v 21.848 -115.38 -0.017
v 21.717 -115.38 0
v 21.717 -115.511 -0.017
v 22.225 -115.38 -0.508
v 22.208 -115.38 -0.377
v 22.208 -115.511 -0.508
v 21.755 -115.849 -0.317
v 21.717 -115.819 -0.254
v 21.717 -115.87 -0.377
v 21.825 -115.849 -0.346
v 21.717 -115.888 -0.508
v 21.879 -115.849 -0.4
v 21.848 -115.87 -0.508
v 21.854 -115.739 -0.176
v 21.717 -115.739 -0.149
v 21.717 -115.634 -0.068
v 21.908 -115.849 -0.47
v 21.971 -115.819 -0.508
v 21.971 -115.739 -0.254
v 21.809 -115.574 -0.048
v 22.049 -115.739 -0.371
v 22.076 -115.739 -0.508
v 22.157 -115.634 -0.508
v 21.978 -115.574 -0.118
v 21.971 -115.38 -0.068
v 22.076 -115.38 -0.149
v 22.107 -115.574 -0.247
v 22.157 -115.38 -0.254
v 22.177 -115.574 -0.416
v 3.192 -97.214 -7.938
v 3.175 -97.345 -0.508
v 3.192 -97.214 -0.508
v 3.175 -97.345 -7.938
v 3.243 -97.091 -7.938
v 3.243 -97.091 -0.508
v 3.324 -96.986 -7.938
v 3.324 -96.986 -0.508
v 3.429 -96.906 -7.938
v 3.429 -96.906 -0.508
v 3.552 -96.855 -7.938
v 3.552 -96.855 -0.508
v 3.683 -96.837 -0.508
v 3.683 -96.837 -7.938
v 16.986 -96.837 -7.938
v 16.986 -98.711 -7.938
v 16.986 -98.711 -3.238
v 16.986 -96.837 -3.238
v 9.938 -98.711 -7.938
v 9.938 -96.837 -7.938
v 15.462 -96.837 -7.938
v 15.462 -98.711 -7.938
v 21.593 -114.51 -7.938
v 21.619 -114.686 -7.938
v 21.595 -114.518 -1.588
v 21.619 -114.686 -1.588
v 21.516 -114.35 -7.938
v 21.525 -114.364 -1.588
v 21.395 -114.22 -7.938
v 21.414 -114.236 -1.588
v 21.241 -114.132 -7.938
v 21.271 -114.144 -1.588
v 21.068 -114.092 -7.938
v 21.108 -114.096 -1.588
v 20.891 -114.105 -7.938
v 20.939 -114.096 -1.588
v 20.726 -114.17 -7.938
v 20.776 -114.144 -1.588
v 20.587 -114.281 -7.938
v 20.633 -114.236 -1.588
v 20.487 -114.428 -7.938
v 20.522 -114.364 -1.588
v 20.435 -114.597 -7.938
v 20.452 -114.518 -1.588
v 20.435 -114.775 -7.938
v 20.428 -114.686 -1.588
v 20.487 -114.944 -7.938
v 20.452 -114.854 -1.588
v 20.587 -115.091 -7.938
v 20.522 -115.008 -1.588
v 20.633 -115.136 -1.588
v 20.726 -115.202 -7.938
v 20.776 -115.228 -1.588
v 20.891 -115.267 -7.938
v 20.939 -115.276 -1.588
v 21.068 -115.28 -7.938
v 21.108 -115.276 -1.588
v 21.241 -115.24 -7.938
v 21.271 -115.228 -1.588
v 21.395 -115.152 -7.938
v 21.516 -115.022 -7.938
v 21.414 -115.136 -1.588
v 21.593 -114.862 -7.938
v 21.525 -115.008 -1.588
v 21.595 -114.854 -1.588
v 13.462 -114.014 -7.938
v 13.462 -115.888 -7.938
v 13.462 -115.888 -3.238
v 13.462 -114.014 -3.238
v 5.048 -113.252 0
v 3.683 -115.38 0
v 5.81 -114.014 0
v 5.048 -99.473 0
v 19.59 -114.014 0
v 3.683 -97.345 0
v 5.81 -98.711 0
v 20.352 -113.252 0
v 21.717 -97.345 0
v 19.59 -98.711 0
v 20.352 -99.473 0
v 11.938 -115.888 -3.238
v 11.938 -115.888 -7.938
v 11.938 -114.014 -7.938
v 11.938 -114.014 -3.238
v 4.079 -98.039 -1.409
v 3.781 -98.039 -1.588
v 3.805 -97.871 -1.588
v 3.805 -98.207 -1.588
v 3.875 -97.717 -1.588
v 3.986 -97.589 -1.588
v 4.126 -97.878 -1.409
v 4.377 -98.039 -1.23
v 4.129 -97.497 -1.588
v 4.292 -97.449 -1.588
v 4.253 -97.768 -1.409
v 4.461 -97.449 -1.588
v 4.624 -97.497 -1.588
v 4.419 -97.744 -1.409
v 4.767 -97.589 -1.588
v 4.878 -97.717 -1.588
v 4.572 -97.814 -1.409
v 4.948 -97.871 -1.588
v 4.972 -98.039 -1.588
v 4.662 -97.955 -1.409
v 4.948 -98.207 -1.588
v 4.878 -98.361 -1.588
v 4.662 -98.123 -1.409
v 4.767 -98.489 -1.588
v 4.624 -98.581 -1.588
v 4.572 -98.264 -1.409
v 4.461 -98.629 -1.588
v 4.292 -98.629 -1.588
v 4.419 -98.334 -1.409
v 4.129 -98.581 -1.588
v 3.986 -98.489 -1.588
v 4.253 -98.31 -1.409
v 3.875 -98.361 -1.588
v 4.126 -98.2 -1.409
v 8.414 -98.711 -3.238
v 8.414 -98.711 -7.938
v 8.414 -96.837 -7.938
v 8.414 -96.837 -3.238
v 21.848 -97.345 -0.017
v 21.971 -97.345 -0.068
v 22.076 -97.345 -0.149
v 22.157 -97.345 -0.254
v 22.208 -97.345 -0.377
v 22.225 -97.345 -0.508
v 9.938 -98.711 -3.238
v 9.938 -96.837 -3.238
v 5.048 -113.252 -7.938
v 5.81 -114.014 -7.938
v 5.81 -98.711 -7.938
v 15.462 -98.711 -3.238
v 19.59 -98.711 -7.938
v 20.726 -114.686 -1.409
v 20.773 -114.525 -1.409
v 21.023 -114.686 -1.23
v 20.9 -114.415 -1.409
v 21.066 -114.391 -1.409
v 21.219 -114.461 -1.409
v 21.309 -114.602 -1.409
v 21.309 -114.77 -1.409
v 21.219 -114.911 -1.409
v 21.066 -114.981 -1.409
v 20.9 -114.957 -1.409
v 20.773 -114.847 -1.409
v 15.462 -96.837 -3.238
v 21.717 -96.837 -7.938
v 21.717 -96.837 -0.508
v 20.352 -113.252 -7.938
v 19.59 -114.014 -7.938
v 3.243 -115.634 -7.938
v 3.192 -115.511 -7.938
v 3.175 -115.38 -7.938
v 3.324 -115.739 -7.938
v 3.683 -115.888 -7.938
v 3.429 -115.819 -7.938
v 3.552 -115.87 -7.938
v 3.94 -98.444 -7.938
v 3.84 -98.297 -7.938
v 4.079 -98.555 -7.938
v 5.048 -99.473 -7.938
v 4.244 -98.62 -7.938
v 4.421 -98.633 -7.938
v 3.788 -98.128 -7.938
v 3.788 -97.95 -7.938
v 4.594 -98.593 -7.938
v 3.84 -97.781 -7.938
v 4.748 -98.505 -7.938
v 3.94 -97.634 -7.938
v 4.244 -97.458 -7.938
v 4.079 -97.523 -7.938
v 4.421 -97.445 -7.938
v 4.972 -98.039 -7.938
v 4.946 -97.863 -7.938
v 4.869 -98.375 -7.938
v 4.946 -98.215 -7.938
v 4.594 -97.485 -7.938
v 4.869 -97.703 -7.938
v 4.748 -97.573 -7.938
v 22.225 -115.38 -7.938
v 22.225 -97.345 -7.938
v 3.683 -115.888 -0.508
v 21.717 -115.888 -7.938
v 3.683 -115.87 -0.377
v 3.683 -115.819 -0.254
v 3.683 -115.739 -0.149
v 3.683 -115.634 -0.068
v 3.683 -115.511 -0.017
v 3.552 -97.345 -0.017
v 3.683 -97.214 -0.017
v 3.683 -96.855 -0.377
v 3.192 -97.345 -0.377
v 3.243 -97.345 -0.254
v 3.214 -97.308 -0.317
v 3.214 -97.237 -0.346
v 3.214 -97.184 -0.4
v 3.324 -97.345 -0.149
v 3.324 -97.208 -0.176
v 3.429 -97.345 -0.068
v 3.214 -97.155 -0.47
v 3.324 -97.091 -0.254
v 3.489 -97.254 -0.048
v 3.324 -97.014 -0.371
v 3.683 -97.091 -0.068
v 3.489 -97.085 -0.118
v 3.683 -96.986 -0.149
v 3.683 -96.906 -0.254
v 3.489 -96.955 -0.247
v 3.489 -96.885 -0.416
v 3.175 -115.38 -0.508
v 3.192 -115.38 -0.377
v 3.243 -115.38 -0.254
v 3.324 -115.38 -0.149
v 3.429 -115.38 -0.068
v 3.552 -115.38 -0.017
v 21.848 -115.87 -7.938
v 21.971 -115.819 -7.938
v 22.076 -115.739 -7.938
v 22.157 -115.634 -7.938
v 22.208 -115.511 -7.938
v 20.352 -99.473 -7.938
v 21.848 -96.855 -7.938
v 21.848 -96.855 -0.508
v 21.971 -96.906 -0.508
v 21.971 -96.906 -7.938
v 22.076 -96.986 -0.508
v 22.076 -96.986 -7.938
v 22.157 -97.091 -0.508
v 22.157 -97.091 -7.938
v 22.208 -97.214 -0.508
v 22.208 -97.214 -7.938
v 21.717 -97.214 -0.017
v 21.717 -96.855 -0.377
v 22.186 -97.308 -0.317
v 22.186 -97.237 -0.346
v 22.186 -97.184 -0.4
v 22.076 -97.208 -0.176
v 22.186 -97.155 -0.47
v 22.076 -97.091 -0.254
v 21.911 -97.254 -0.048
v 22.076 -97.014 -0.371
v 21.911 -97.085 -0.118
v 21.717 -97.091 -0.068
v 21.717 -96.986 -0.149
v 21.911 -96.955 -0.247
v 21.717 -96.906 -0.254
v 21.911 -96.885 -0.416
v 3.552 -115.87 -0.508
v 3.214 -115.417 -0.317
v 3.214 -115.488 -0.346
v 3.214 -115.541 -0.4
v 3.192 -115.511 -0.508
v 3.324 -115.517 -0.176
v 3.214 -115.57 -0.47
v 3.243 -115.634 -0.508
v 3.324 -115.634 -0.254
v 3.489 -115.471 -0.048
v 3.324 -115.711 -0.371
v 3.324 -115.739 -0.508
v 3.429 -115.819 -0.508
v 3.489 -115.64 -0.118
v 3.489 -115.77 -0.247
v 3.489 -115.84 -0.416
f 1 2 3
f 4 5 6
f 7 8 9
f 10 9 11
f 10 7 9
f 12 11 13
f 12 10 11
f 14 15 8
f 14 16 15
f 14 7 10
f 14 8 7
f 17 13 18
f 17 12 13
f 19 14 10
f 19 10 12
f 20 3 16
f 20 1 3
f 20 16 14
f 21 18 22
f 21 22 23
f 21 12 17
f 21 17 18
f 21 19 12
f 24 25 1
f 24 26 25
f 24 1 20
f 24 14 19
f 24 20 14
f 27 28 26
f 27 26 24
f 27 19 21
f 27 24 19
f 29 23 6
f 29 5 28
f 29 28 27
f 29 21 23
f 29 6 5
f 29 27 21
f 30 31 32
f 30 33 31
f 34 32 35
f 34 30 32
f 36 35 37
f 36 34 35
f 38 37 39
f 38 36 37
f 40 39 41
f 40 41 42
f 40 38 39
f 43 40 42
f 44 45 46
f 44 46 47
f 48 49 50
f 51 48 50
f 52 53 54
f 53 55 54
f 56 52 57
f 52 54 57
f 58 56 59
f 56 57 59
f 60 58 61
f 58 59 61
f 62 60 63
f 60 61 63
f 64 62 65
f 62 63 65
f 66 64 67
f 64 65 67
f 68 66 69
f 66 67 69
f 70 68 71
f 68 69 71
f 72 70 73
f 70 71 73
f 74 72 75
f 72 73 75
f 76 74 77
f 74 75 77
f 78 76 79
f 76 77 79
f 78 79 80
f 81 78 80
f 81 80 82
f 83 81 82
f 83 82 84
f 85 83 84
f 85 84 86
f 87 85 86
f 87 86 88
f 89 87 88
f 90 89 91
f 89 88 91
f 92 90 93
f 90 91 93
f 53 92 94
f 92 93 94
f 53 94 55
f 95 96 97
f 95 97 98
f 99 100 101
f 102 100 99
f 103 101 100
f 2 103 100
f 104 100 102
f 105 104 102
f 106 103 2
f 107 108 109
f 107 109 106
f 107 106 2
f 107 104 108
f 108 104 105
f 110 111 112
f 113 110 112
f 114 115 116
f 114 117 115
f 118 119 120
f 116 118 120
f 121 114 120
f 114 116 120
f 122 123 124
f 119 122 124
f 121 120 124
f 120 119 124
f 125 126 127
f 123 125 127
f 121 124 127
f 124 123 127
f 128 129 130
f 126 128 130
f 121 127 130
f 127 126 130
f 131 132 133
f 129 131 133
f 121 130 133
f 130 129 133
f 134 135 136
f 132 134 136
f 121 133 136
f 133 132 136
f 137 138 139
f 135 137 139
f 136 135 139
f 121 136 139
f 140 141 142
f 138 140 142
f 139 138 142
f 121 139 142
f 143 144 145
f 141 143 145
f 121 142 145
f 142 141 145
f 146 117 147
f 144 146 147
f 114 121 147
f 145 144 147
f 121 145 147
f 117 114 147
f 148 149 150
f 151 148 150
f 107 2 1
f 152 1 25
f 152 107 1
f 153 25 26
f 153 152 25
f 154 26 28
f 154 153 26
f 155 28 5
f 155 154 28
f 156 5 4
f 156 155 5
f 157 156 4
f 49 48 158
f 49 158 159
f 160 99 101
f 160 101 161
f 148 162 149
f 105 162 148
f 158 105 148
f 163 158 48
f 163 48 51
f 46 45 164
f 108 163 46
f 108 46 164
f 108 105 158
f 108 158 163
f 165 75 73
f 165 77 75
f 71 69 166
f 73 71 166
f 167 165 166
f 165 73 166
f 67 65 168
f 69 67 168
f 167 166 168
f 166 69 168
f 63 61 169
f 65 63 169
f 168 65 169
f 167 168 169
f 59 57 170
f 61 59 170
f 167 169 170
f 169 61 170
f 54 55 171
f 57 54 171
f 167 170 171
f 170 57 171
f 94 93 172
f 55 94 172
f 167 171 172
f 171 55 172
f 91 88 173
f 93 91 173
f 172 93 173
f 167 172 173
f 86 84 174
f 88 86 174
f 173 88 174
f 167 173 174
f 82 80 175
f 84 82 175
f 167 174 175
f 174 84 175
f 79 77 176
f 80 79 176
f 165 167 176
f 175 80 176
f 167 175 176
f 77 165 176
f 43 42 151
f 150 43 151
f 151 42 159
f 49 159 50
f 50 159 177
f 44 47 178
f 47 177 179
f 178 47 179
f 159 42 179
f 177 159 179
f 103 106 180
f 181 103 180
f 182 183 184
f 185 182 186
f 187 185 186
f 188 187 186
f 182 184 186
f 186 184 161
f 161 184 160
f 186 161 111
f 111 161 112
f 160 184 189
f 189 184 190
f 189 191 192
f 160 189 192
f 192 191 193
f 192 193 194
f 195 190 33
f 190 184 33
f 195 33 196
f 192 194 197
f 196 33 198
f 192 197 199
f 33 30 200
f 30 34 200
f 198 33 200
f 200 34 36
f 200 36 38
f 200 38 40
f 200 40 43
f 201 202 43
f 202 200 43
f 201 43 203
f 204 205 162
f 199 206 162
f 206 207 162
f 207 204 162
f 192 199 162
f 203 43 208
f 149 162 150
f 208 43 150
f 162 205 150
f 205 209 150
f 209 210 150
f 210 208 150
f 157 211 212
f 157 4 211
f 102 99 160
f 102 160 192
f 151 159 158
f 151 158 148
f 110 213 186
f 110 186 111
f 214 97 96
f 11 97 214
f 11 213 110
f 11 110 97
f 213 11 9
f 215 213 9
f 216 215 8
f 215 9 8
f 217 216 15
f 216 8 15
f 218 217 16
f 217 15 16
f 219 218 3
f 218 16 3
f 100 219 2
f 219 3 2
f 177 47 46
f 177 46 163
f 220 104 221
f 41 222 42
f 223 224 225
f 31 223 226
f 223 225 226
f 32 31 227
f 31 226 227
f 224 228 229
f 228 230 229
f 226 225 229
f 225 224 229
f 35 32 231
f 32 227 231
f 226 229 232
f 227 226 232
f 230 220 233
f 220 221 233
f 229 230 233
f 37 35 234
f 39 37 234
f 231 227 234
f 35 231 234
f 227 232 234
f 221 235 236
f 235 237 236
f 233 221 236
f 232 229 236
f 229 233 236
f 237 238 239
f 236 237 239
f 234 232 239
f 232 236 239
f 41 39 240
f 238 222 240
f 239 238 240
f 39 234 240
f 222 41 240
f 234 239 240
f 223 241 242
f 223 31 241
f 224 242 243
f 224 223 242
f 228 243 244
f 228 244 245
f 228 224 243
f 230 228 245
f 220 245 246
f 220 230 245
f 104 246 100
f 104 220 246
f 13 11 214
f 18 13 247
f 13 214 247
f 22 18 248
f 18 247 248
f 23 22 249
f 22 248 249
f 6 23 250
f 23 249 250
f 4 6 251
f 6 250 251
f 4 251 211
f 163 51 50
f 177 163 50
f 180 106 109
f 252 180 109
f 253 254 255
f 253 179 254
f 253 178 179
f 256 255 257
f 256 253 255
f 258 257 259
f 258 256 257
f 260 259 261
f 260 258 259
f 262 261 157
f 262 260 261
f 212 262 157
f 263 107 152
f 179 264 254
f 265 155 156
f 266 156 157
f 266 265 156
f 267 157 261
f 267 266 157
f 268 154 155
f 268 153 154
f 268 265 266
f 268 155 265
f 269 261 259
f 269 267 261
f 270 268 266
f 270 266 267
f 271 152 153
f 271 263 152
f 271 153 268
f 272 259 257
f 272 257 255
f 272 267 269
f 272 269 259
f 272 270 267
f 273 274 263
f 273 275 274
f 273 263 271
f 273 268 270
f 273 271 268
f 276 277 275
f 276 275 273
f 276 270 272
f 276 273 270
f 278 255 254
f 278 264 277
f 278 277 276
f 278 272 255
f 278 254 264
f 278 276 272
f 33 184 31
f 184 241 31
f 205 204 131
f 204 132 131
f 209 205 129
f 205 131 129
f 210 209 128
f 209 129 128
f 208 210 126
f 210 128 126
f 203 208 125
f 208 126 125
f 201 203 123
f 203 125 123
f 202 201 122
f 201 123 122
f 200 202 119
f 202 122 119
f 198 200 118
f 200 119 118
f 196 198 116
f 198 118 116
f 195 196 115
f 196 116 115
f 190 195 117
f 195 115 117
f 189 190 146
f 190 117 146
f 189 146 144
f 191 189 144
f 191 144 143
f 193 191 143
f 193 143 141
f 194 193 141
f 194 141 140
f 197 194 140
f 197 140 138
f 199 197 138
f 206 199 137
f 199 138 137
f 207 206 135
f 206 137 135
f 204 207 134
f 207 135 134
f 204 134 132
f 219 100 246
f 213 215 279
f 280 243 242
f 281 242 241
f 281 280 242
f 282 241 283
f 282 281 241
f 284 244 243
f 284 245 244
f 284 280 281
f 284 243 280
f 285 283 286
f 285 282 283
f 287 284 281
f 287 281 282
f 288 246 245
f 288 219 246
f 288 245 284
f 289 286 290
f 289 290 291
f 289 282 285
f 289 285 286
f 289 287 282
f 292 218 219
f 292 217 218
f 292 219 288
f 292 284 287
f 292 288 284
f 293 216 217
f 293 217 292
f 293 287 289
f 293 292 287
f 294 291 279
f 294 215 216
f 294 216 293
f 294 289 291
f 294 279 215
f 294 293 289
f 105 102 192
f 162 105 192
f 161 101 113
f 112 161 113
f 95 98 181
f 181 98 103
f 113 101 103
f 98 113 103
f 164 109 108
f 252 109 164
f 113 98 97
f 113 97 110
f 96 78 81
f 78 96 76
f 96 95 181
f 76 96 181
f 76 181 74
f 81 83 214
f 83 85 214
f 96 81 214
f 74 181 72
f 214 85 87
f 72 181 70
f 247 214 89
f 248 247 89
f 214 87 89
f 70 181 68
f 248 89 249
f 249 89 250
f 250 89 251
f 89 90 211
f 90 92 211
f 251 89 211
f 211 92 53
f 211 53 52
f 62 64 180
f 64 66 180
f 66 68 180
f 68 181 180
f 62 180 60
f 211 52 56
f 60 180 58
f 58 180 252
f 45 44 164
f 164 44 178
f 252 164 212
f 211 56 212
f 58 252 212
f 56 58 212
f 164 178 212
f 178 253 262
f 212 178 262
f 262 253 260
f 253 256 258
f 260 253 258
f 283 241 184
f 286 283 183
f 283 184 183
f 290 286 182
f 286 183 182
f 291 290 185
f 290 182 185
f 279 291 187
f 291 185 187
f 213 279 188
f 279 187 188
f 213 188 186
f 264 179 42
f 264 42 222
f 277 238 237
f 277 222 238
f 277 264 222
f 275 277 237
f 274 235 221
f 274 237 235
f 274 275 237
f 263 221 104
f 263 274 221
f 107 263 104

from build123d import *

# Parameters (mm, degrees)
SKETCH1_W                 = 19.05
SKETCH1_H                 = 19.05
SKETCH1_W_2               = 15.3035
SKETCH1_H_2               = 15.3035
BOSS_EXTRUDE1_DEPTH       = 7.9375
SKETCH2_W                 = 1.524
SKETCH2_H                 = 1.87325
CUT_EXTRUDE_THIN1_DEPTH   = 4.699
FILLET2_R                 = 0.508
CHAMFER1_SIZE             = 0.762
F_0_80_TAPPED_HOLE1_D     = 1.19126
F_0_80_TAPPED_HOLE1_DEPTH = 6.35
F_0_80_TAPPED_HOLE1_TIP   = 0.357890611


with BuildPart() as part:
    # Sketch1 → Boss-Extrude1 (new body)
    with BuildSketch(Plane.XY):
        with Locations((12.7, -106.3625)):
            Rectangle(SKETCH1_W, SKETCH1_H)
        with Locations((12.7, -106.3625)):
            Rectangle(SKETCH1_W_2, SKETCH1_H_2, mode=Mode.SUBTRACT)
    extrude(amount=-BOSS_EXTRUDE1_DEPTH)

    # Sketch2 → Cut-Extrude-Thin1 (cut)
    with BuildSketch(Plane(origin=(0, 0, -7.9375), x_dir=(-1, 0, 0), z_dir=(0, 0, -1))):
        with Locations((-12.7, -114.950875)):
            Rectangle(SKETCH2_W, SKETCH2_H)
        with Locations((-9.17575, -97.774125)):
            Rectangle(SKETCH2_W, SKETCH2_H)
        with Locations((-16.22425, -97.774125)):
            Rectangle(SKETCH2_W, SKETCH2_H)
    extrude(amount=-CUT_EXTRUDE_THIN1_DEPTH, mode=Mode.SUBTRACT)

    # Fillet2
    fillet2_edges = [part.edges().sort_by_distance(p)[0] for p in [
        (12.7, -96.8375, 0),
        (22.225, -106.3625, 0),
        (12.7, -115.8875, 0),
        (3.175, -106.3625, 0),
        (3.175, -96.8375, -3.96875),
        (22.225, -96.8375, -3.96875),
        (22.225, -115.8875, -3.96875),
        (3.175, -115.8875, -3.96875),
    ]]
    fillet(fillet2_edges, radius=FILLET2_R)

    # Chamfer1
    chamfer1_edges = [part.edges().sort_by_distance(p)[0] for p in [
        (5.04825, -114.01425, -3.96875),
        (5.04825, -98.71075, -3.96875),
        (20.35175, -98.71075, -3.96875),
        (20.35175, -114.01425, -3.96875),
    ]]
    chamfer(chamfer1_edges, length=CHAMFER1_SIZE)

    # #0-80 Tapped Hole1
    with Locations(Plane(origin=(0, 0, -7.9375), x_dir=(-1, 0, 0), z_dir=(0, 0, -1))):
        with Locations((-4.376519878, -98.039019878), (-21.023480122, -114.685980122)):
            Hole(F_0_80_TAPPED_HOLE1_D / 2, depth=F_0_80_TAPPED_HOLE1_DEPTH)
            with Locations((0, 0, -(F_0_80_TAPPED_HOLE1_DEPTH + F_0_80_TAPPED_HOLE1_TIP / 2))):  # 118° drill point
                Cone(0, F_0_80_TAPPED_HOLE1_D / 2, F_0_80_TAPPED_HOLE1_TIP, mode=Mode.SUBTRACT)


solid = part.part
